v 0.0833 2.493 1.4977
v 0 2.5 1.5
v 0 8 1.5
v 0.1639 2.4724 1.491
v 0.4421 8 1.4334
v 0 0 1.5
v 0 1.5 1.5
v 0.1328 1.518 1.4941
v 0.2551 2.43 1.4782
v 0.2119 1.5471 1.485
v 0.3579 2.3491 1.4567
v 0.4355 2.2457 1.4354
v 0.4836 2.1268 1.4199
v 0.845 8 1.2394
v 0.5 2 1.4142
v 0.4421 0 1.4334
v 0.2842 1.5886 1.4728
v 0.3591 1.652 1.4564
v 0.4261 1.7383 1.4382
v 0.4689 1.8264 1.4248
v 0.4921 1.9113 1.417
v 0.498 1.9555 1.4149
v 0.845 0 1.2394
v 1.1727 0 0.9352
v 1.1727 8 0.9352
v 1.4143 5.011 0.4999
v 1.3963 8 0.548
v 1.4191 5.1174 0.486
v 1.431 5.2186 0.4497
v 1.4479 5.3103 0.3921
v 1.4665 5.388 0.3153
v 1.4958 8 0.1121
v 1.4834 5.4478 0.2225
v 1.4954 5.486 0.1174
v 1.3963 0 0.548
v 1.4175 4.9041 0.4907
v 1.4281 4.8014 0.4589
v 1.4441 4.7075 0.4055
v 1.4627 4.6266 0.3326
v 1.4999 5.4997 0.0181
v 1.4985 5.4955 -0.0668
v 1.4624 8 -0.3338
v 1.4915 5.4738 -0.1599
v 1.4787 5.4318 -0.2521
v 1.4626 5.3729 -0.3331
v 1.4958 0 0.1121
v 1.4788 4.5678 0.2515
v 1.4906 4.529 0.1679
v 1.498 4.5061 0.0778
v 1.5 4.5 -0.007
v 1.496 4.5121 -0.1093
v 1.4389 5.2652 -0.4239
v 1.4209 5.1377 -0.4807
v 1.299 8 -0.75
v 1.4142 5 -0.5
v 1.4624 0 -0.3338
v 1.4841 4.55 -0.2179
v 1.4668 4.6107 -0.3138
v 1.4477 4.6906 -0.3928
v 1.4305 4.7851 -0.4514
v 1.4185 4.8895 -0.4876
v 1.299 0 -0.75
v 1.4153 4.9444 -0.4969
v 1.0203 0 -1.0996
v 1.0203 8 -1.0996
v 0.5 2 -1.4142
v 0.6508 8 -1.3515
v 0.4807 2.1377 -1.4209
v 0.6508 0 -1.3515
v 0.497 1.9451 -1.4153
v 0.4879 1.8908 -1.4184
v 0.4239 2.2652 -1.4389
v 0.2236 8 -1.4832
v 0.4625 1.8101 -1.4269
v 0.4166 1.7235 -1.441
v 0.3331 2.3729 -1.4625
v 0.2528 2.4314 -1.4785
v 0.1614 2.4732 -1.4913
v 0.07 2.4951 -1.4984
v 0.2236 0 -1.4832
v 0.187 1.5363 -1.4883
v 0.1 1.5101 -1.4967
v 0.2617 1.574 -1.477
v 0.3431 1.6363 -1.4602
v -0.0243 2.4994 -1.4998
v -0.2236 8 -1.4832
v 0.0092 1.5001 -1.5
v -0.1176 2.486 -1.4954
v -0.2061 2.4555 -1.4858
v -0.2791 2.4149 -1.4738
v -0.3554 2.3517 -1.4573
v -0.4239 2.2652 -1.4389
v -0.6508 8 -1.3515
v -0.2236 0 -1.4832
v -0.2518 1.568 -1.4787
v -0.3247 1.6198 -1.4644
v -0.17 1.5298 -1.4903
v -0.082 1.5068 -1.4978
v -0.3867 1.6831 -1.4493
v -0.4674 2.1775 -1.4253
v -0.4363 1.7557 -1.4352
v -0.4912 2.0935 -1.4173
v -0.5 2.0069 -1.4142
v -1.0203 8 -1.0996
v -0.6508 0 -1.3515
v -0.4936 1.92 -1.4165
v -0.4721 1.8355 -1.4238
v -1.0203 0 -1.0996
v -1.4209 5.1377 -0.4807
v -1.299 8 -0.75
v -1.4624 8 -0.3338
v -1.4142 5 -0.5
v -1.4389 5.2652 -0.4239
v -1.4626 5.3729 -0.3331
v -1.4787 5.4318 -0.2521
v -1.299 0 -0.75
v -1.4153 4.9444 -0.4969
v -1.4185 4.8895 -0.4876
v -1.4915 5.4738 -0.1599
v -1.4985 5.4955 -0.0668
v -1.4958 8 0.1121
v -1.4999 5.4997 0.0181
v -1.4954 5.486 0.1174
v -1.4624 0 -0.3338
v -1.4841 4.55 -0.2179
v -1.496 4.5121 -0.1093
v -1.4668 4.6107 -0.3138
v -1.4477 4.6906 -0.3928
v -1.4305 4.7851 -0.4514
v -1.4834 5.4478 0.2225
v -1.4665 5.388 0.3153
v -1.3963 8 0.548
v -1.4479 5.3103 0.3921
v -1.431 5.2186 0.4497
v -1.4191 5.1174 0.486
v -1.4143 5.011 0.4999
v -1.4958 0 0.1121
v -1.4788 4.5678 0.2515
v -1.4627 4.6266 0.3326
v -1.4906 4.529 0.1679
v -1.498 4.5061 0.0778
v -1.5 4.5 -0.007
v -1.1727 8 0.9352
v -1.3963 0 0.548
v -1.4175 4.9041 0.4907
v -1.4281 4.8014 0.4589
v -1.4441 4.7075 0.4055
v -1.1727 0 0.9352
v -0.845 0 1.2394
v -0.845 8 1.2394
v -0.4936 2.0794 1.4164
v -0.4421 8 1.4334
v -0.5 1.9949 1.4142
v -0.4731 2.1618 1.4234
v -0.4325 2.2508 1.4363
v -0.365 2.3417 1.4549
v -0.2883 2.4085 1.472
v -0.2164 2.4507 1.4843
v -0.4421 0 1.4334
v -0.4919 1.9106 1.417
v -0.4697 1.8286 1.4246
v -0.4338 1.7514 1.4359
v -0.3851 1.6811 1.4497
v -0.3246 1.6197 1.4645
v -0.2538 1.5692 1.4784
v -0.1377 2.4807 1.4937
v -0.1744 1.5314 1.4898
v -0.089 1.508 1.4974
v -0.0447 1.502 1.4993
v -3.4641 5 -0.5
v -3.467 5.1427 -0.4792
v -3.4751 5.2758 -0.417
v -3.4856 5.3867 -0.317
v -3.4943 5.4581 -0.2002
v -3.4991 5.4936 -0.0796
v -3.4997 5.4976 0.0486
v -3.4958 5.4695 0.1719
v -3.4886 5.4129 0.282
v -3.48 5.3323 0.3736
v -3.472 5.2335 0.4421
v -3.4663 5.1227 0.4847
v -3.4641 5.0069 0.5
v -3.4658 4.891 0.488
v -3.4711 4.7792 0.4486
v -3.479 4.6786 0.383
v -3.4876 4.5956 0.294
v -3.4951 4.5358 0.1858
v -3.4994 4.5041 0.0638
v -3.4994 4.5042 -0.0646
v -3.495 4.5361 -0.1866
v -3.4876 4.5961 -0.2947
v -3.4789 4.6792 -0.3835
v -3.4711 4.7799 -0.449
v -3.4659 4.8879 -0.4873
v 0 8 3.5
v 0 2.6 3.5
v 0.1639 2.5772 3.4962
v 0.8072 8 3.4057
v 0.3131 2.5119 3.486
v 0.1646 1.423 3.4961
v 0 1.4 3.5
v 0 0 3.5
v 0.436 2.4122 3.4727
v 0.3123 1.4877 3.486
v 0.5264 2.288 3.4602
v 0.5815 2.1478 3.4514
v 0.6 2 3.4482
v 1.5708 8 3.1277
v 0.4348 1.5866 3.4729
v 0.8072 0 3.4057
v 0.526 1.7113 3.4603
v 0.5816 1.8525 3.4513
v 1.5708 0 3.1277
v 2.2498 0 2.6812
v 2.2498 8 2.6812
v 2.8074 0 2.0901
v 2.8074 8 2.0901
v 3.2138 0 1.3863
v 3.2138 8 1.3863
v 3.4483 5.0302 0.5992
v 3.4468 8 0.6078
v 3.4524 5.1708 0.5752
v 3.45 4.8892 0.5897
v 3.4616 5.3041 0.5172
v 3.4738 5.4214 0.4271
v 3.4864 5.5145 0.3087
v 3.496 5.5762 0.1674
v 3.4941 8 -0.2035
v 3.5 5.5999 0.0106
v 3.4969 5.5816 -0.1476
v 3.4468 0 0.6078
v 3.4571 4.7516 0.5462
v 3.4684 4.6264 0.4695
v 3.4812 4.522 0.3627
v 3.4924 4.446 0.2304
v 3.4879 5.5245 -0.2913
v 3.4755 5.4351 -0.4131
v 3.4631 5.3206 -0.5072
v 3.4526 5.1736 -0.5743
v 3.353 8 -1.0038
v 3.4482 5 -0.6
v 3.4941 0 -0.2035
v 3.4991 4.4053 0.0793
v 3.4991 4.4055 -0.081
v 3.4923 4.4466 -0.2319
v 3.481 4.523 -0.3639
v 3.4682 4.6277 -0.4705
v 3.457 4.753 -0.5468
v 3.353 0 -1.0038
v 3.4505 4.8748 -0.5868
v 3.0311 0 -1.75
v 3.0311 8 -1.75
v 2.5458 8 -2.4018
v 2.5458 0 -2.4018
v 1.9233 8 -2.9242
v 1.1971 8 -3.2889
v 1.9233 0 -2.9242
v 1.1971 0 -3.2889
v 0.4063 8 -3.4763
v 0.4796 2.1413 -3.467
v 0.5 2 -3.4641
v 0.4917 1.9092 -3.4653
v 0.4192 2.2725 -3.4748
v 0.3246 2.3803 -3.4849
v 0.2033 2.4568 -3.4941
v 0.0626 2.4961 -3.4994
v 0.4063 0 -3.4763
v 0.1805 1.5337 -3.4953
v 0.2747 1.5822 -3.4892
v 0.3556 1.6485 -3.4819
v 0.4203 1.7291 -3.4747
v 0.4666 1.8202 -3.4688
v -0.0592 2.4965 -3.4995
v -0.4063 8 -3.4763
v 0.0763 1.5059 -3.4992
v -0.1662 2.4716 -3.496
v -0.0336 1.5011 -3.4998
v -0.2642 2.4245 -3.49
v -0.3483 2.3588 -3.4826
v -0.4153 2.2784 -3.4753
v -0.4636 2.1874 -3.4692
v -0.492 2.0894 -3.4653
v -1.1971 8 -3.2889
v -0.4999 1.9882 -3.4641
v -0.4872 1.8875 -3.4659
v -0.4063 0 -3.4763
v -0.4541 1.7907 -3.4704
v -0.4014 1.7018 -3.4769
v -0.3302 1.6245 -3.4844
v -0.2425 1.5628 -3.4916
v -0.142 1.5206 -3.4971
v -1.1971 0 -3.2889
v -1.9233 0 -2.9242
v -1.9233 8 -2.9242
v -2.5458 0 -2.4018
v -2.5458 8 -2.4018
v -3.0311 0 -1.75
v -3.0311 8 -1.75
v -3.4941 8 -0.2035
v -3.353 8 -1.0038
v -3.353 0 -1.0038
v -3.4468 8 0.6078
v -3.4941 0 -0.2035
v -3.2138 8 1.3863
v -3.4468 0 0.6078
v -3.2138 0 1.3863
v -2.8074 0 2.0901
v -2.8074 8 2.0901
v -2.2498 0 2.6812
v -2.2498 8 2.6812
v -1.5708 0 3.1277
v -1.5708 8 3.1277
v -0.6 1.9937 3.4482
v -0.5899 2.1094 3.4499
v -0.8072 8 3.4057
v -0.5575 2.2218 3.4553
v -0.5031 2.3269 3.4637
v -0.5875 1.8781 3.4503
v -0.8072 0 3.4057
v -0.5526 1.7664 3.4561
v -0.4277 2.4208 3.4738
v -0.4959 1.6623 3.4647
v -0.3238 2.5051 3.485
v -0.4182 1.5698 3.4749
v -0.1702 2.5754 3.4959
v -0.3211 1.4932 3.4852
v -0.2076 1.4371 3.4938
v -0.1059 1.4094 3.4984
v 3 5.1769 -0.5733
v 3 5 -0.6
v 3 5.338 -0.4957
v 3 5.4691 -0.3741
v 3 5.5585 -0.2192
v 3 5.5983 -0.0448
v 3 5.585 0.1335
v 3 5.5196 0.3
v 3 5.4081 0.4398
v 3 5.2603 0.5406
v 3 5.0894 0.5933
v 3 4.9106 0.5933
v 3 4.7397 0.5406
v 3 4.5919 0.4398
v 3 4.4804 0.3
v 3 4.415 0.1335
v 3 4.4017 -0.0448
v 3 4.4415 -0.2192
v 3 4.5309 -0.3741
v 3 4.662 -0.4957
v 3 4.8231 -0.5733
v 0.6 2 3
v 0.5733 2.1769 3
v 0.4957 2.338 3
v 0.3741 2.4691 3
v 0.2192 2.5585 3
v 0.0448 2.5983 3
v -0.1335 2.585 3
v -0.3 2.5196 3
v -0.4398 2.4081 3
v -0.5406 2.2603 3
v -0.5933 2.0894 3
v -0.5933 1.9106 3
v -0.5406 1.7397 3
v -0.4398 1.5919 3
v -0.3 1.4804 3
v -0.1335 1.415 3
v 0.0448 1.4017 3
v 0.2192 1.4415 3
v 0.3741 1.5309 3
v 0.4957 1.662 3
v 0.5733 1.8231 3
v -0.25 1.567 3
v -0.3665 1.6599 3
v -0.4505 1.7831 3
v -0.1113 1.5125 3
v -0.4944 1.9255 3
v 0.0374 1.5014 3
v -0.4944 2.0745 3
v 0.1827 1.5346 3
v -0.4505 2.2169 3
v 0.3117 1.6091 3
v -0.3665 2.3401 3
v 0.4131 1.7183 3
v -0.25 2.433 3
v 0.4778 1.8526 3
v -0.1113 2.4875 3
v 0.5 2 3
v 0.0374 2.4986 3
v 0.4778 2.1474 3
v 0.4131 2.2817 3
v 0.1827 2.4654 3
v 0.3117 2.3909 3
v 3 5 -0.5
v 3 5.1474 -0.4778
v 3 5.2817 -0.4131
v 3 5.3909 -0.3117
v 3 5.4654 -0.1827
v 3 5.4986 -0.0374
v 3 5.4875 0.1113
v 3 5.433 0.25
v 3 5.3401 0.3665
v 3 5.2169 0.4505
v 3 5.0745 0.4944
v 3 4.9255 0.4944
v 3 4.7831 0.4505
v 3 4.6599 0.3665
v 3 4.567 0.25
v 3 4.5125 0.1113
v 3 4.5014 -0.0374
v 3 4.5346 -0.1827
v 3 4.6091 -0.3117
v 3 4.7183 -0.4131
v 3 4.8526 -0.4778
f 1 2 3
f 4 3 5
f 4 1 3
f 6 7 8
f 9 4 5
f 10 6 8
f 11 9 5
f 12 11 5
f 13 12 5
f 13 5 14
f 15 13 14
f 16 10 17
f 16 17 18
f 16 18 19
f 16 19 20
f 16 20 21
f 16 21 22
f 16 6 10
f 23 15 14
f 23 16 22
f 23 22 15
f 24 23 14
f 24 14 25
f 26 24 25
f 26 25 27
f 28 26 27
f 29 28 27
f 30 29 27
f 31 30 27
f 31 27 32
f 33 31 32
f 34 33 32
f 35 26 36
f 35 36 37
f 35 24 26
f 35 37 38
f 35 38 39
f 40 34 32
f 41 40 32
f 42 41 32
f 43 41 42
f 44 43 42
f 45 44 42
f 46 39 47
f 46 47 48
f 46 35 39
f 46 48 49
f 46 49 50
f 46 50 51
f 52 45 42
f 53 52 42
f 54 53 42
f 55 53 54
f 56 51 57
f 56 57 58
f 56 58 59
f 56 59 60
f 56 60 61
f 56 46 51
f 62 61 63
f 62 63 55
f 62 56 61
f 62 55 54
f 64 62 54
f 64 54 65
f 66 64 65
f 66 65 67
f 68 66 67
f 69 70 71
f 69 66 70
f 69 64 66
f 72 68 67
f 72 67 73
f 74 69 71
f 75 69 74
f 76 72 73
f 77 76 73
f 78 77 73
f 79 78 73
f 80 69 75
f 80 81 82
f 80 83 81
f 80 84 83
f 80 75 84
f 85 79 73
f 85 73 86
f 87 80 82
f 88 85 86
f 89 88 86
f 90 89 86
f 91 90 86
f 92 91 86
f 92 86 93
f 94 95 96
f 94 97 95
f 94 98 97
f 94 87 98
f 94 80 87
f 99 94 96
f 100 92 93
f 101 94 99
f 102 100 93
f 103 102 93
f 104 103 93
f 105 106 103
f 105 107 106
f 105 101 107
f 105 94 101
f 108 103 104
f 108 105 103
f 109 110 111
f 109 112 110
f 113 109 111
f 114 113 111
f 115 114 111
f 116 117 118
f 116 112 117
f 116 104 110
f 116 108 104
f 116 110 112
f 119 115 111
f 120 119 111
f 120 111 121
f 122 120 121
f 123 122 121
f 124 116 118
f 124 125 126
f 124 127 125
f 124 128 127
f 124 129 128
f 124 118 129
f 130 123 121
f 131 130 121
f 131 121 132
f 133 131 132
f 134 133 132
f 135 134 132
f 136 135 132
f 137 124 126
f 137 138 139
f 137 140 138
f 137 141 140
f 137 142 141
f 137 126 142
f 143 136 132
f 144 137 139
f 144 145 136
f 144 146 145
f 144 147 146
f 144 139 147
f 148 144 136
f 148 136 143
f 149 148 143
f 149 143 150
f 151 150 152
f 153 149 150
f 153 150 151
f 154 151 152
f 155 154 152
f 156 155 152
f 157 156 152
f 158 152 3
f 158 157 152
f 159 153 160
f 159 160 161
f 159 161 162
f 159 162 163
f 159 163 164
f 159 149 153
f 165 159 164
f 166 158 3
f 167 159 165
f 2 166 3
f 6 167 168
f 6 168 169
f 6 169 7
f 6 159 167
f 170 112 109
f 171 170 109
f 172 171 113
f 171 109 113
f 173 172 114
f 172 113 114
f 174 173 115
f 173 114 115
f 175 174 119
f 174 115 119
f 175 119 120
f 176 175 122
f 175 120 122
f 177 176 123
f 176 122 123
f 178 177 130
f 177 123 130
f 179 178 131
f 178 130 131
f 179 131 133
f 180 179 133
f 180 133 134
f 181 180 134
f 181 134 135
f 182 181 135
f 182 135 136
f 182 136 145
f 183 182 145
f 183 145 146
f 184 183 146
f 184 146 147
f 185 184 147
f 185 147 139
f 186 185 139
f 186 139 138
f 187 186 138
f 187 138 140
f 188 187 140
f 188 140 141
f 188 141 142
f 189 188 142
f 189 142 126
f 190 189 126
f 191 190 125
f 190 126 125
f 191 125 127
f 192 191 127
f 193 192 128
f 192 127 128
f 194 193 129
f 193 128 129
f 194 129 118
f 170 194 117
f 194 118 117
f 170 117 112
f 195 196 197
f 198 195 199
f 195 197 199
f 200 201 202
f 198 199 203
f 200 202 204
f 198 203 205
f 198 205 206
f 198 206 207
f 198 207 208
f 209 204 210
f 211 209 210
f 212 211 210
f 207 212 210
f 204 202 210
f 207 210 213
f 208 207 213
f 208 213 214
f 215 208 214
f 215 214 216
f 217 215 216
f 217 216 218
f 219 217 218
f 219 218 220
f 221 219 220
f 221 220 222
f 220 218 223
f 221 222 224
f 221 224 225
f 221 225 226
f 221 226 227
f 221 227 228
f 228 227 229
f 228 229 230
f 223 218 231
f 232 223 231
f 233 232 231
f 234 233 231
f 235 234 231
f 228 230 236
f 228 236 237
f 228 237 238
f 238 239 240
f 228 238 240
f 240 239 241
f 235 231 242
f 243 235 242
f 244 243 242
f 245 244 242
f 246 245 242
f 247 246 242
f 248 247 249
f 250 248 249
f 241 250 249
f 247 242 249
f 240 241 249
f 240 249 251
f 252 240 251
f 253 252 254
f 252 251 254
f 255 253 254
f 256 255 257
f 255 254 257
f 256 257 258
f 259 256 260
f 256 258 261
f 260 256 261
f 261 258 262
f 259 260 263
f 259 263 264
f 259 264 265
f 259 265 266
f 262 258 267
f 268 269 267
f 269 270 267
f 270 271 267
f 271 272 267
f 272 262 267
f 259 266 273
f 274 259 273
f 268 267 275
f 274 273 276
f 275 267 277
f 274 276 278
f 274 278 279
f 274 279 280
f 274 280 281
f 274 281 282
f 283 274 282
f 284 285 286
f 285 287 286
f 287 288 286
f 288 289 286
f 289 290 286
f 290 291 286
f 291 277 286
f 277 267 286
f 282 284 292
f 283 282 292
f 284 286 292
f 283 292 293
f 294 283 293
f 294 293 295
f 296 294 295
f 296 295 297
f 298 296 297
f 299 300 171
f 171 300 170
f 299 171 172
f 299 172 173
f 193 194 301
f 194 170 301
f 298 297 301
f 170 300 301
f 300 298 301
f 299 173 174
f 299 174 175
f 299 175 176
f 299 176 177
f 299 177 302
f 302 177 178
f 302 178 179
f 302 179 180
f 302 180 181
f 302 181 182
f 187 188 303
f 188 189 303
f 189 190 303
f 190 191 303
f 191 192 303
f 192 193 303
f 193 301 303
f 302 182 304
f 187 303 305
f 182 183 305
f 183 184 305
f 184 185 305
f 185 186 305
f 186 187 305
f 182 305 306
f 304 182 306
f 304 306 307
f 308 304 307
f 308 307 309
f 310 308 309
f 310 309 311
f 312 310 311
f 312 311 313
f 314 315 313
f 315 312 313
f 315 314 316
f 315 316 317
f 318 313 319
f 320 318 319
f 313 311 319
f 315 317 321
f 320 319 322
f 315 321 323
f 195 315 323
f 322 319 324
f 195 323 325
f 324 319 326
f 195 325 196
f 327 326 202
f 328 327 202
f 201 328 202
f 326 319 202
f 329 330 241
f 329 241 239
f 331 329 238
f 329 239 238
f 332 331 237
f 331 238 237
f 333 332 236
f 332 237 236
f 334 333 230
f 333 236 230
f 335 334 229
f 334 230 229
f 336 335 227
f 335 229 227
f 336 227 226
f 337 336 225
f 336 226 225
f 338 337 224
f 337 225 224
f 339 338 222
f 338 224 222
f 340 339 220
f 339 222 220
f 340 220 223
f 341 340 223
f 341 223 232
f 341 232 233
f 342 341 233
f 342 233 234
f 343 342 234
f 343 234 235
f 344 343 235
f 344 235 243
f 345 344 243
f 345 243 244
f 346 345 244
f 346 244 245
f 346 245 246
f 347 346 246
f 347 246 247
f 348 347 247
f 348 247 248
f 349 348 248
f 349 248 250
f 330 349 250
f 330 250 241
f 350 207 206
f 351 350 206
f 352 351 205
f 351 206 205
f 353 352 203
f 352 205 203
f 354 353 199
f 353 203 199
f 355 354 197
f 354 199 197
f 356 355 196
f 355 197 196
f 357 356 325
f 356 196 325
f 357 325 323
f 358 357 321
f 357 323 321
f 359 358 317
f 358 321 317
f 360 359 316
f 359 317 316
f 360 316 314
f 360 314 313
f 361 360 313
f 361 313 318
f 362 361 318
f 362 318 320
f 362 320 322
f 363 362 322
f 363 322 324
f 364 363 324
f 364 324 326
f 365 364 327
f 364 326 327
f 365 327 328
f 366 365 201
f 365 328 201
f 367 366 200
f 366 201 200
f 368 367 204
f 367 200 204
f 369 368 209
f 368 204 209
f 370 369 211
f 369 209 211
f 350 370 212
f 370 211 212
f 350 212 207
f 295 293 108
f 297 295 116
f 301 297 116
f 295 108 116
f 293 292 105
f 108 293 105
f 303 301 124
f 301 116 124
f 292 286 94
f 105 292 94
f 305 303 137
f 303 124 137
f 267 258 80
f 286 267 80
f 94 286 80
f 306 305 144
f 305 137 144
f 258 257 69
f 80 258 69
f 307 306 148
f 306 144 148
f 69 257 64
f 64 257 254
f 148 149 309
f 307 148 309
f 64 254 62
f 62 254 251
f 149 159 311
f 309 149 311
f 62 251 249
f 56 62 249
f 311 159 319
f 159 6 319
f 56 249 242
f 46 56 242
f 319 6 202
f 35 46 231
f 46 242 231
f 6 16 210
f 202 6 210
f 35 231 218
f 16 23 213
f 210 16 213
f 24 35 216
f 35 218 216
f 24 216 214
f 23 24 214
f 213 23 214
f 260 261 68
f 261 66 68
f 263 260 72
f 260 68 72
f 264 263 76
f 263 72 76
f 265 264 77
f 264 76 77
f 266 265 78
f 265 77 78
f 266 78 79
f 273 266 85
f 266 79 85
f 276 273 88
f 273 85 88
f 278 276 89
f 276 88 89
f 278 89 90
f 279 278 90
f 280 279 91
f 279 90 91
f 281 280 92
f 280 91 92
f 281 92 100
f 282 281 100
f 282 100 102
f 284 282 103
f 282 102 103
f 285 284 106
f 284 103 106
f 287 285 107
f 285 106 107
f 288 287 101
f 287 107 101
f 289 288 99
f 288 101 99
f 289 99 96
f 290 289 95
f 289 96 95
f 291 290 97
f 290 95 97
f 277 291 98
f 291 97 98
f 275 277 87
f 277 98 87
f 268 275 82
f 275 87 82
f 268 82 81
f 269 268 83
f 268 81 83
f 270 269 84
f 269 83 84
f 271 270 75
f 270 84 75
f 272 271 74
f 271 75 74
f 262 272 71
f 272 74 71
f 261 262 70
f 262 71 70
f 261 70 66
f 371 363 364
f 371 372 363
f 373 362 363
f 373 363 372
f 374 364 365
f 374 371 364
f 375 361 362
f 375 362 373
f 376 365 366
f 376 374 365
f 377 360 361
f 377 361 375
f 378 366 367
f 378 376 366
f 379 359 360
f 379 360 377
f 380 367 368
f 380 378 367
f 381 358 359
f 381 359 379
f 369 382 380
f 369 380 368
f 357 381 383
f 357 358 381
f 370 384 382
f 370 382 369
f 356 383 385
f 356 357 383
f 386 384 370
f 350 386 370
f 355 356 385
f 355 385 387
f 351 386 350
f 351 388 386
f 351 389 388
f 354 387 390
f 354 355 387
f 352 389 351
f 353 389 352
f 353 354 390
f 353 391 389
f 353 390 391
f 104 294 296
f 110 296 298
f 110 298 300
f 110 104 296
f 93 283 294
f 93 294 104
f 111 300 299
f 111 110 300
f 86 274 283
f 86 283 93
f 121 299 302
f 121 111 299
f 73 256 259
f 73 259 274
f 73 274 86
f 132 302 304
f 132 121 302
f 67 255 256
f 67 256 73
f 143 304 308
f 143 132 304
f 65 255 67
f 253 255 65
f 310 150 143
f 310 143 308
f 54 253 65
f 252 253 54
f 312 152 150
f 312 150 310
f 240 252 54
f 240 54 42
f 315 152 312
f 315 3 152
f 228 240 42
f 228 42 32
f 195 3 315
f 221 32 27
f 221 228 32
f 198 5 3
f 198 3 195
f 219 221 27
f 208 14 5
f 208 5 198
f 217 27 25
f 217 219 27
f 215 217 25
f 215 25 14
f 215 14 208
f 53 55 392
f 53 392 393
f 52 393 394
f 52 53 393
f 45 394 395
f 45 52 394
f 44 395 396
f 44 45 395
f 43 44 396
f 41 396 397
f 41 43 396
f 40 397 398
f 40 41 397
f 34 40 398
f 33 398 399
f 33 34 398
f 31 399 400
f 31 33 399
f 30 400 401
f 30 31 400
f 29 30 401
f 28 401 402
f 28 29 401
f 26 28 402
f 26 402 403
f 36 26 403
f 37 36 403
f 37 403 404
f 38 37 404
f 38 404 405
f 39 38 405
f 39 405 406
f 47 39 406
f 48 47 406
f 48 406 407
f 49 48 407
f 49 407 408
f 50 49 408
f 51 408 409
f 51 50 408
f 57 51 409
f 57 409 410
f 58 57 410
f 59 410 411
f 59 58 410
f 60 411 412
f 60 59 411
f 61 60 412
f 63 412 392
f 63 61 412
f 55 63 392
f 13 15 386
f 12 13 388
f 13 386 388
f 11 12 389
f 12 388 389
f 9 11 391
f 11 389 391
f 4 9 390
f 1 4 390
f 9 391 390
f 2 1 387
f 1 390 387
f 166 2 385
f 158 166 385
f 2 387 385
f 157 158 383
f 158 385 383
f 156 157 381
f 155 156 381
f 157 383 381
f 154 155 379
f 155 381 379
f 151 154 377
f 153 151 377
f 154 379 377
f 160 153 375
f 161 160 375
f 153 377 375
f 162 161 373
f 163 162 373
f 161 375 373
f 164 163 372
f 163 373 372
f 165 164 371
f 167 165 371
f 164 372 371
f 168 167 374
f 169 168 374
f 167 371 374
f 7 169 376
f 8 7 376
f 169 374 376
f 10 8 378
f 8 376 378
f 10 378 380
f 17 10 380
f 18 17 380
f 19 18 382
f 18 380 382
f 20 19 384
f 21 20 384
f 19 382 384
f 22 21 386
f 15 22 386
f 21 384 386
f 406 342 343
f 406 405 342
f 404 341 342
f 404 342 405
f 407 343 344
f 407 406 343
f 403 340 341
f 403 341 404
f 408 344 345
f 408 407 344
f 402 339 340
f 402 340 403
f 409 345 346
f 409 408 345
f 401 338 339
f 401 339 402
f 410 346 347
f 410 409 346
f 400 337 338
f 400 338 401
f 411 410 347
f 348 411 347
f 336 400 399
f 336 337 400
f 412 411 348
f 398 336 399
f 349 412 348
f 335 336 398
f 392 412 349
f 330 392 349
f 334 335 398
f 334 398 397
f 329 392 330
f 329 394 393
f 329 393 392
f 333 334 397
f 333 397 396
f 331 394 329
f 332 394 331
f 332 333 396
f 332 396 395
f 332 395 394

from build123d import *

# Parameters (mm, degrees)
SKETCH1_R                      = 3.5
SKETCH1_R_2                    = 1.5
BOSS_EXTRUDE1_DEPTH            = 8
CUT_EXTRUDE1_REACH             = 11.407
SKETCH2_R                      = 0.5
CUT_EXTRUDE1_DIRECTION_2_REACH = 11.407
SKETCH3_R                      = 0.5
CUT_EXTRUDE2_DEPTH             = 3.5
CUT_EXTRUDE3_START             = 4
SKETCH4_R                      = 0.6
CUT_EXTRUDE3_DEPTH             = 1
CUT_EXTRUDE4_START             = 4
SKETCH7_R                      = 0.6
CUT_EXTRUDE4_DEPTH             = 1


with BuildPart() as part:
    # Sketch1 → Boss-Extrude1 (new body)
    with BuildSketch(Plane(origin=(0, 0, 0), x_dir=(1, 0, 0), z_dir=(0, 1, 0))):
        with Locations(Location((0, 0, 0), (0, 0, 270))):
            Circle(SKETCH1_R)
        with Locations(Location((0, 0, 0), (0, 0, 270))):
            Circle(SKETCH1_R_2, mode=Mode.SUBTRACT)
    extrude(amount=BOSS_EXTRUDE1_DEPTH)

    # Sketch2 → Cut-Extrude1 (cut, up to next)
    with BuildSketch(Plane(origin=(0, 0, 0), x_dir=(0, 0, -1), z_dir=(1, 0, 0)), mode=Mode.PRIVATE) as cut_extrude1_sk1:
        with Locations((0, 5)):
            Circle(SKETCH2_R)
    cut_extrude1_tool1 = extrude(cut_extrude1_sk1.sketch, amount=-CUT_EXTRUDE1_REACH, mode=Mode.PRIVATE) & part.part
    add(cut_extrude1_tool1.solids().sort_by_distance((0, 5, 0))[0], mode=Mode.SUBTRACT)

    # Sketch2 → Cut-Extrude1 direction 2 (cut, up to next)
    with BuildSketch(Plane(origin=(0, 0, 0), x_dir=(0, 0, -1), z_dir=(1, 0, 0)), mode=Mode.PRIVATE) as cut_extrude1_direction_2_sk1:
        with Locations((0, 5)):
            Circle(SKETCH2_R)
    cut_extrude1_direction_2_tool1 = extrude(cut_extrude1_direction_2_sk1.sketch, amount=CUT_EXTRUDE1_DIRECTION_2_REACH, mode=Mode.PRIVATE) & part.part
    add(cut_extrude1_direction_2_tool1.solids().sort_by_distance((0, 5, 0))[0], mode=Mode.SUBTRACT)

    # Sketch3 → Cut-Extrude2 (cut, symmetric)
    with BuildSketch(Plane.XY):
        with Locations((0, 2)):
            Circle(SKETCH3_R)
    extrude(amount=CUT_EXTRUDE2_DEPTH, both=True, mode=Mode.SUBTRACT)

    # Sketch4 → Cut-Extrude3 (cut)
    with BuildSketch(Plane.XY.offset(CUT_EXTRUDE3_START)):
        with Locations((0, 2)):
            Circle(SKETCH4_R)
    extrude(amount=-CUT_EXTRUDE3_DEPTH, mode=Mode.SUBTRACT)

    # Sketch7 → Cut-Extrude4 (cut)
    with BuildSketch(Plane(origin=(0, 0, 0), x_dir=(0, 0, -1), z_dir=(1, 0, 0)).offset(CUT_EXTRUDE4_START)):
        with Locations((0, 5)):
            Circle(SKETCH7_R)
    extrude(amount=-CUT_EXTRUDE4_DEPTH, mode=Mode.SUBTRACT)


solid = part.part
